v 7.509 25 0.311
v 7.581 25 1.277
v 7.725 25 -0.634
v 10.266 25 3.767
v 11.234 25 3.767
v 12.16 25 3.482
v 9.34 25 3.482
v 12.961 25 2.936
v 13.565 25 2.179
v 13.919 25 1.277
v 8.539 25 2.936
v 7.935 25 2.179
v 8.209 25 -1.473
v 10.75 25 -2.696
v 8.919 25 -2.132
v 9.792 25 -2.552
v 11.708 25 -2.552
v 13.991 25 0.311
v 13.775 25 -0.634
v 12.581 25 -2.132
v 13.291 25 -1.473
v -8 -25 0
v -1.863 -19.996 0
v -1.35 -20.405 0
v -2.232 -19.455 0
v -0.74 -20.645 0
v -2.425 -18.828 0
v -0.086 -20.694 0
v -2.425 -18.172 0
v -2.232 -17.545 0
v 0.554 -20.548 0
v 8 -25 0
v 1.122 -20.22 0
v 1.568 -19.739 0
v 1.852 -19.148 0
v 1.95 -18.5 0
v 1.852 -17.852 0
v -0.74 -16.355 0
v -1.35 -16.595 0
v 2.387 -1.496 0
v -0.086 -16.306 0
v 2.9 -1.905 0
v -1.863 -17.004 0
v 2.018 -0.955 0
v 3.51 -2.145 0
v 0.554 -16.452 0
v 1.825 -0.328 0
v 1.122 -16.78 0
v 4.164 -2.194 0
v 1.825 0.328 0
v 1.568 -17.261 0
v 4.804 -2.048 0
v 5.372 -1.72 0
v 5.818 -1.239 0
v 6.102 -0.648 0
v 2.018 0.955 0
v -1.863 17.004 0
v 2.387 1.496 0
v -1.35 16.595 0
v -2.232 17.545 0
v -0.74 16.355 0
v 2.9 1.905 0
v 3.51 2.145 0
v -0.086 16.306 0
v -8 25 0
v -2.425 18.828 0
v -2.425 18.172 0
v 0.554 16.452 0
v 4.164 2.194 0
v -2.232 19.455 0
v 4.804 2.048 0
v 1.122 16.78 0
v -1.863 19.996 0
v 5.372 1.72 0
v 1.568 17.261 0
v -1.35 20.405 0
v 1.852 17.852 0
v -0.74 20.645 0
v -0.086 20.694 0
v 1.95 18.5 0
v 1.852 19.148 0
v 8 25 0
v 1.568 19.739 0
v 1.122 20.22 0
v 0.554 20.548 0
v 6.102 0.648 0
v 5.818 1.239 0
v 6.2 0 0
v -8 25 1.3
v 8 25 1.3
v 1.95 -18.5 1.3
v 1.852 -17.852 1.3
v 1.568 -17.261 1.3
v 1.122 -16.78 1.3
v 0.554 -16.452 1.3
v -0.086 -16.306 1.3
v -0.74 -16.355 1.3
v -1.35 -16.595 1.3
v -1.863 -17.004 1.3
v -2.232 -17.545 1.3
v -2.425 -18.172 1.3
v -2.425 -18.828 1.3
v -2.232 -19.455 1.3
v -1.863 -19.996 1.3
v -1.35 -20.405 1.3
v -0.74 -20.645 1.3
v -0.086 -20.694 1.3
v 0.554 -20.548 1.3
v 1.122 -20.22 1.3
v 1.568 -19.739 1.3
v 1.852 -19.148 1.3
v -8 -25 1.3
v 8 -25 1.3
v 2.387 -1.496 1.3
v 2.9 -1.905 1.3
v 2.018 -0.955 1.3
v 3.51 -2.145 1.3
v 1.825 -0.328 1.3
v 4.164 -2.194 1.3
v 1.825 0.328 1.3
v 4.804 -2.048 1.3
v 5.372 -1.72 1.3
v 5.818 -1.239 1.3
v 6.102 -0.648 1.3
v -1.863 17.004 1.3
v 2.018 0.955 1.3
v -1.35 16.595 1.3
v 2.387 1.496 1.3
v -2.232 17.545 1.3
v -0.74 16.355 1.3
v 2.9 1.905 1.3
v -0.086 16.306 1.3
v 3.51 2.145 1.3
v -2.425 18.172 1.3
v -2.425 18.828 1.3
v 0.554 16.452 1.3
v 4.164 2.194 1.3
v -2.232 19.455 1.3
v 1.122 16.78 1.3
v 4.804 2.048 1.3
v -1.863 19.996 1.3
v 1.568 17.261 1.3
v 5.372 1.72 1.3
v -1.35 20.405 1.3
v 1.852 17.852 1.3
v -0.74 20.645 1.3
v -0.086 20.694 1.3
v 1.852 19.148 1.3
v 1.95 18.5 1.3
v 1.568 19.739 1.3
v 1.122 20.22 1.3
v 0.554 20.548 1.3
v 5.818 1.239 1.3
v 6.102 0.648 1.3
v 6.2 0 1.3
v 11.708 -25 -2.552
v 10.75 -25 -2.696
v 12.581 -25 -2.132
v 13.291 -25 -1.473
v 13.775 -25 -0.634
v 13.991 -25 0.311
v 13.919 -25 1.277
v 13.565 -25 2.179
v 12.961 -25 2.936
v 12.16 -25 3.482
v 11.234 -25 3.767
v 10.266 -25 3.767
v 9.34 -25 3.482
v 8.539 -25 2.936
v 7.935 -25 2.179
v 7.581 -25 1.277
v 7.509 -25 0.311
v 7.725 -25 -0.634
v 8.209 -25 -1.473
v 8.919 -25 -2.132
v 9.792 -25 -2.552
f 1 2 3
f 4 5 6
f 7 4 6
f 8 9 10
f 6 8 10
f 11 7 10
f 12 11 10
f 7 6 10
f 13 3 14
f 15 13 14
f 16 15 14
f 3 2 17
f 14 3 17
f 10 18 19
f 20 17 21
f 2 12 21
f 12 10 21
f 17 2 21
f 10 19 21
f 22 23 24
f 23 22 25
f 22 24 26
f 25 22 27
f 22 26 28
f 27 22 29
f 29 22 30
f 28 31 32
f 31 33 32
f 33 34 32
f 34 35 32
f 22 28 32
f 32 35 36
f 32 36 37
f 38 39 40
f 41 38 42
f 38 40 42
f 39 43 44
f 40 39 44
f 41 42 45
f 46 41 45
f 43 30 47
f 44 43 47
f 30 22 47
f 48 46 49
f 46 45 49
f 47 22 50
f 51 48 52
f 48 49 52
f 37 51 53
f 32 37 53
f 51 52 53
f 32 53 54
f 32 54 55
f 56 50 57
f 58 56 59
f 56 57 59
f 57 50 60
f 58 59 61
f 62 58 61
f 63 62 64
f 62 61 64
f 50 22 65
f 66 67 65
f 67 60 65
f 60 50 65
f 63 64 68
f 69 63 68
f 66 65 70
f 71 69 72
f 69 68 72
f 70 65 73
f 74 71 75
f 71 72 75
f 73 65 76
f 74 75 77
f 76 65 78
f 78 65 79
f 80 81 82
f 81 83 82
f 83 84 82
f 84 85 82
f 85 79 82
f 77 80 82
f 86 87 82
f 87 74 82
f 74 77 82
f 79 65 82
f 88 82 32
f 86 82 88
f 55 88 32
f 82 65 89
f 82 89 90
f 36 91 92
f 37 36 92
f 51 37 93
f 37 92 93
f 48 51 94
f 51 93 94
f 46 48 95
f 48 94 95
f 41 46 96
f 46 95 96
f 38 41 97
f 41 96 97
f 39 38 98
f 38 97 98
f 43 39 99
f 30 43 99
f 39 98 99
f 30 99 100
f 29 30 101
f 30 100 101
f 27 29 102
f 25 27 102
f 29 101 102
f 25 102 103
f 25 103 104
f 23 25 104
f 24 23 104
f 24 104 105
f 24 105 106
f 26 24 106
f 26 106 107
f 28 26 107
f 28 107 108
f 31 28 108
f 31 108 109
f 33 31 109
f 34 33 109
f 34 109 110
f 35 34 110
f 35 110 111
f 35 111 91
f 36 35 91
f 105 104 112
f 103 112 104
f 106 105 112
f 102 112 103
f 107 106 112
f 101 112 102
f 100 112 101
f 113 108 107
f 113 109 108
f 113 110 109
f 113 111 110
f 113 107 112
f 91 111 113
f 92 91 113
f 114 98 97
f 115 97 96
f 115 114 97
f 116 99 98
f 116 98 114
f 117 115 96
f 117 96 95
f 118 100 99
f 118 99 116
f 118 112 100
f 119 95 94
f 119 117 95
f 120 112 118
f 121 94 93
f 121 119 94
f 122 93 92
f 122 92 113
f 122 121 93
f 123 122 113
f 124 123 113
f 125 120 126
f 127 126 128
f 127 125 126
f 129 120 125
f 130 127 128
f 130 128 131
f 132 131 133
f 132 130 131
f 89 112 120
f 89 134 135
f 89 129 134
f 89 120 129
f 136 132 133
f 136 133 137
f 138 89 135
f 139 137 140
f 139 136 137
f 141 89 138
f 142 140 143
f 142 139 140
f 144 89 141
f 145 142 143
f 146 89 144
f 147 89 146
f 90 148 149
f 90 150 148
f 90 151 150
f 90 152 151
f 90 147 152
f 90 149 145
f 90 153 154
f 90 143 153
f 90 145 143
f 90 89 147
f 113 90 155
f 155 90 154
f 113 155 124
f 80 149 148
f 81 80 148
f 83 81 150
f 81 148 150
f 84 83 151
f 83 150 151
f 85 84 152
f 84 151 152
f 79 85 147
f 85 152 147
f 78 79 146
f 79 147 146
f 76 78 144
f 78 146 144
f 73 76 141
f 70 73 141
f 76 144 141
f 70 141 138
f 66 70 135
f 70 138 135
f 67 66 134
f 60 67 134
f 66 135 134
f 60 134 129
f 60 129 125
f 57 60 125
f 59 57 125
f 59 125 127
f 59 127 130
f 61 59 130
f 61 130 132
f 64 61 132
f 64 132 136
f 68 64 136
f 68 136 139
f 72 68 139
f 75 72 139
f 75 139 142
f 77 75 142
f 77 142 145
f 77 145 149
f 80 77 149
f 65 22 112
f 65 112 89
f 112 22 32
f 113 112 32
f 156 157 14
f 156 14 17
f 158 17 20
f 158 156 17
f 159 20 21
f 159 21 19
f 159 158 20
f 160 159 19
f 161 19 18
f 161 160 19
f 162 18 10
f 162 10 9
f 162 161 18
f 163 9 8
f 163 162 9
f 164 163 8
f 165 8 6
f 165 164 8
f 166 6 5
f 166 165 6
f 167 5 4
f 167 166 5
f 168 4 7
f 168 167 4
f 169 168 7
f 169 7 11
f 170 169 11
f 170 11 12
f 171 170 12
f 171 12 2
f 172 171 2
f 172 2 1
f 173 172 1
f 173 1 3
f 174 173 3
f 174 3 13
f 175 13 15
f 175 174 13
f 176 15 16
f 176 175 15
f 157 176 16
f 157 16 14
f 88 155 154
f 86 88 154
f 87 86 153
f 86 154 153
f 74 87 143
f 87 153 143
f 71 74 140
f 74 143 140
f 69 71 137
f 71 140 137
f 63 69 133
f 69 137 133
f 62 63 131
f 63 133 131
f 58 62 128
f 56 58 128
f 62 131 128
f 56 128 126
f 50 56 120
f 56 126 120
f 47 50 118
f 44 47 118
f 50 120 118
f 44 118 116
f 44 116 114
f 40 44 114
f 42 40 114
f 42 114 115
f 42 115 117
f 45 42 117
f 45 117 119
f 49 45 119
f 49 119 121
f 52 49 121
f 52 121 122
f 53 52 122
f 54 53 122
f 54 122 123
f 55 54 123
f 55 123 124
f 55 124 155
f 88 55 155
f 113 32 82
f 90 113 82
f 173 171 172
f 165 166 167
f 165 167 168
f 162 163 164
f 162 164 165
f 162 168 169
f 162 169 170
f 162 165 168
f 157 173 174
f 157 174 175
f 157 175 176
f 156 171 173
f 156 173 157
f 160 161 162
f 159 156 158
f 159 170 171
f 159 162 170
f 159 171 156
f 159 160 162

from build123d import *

# Parameters (mm, degrees)
SKETCH_1_W          = 16
SKETCH_1_H          = 50
EXTRUDE_1_DEPTH     = 1.3
SKETCH_2_R          = 2.2
CUT_EXTRUDE_1_DEPTH = 2
SKETCH_3_R          = 3.25
EXTRUDE_2_DEPTH     = 50


with BuildPart() as part:
    # 草图1 → 凸台-拉伸1 (new body)
    with BuildSketch(Plane.XY):
        Rectangle(SKETCH_1_W, SKETCH_1_H)
    extrude(amount=EXTRUDE_1_DEPTH)

    # 草图2 → 切除-拉伸1 (cut)
    with BuildSketch(Plane.XY.offset(1.3)):
        with Locations((4, 0)):
            Circle(SKETCH_2_R)
        with Locations((-0.25, 18.5)):
            Circle(SKETCH_2_R)
        with Locations((-0.25, -18.5)):
            Circle(SKETCH_2_R)
    extrude(amount=-CUT_EXTRUDE_1_DEPTH, mode=Mode.SUBTRACT)


with BuildPart() as body_2:
    # 草图3 → 凸台-拉伸2 (new body)
    with BuildSketch(Plane.XZ.offset(25)):
        with Locations(Location((10.75, 0.553753861, 0), (0, 0, 270))):
            Circle(SKETCH_3_R)
    extrude(amount=-EXTRUDE_2_DEPTH)


solid = Compound([part.part, body_2.part])
